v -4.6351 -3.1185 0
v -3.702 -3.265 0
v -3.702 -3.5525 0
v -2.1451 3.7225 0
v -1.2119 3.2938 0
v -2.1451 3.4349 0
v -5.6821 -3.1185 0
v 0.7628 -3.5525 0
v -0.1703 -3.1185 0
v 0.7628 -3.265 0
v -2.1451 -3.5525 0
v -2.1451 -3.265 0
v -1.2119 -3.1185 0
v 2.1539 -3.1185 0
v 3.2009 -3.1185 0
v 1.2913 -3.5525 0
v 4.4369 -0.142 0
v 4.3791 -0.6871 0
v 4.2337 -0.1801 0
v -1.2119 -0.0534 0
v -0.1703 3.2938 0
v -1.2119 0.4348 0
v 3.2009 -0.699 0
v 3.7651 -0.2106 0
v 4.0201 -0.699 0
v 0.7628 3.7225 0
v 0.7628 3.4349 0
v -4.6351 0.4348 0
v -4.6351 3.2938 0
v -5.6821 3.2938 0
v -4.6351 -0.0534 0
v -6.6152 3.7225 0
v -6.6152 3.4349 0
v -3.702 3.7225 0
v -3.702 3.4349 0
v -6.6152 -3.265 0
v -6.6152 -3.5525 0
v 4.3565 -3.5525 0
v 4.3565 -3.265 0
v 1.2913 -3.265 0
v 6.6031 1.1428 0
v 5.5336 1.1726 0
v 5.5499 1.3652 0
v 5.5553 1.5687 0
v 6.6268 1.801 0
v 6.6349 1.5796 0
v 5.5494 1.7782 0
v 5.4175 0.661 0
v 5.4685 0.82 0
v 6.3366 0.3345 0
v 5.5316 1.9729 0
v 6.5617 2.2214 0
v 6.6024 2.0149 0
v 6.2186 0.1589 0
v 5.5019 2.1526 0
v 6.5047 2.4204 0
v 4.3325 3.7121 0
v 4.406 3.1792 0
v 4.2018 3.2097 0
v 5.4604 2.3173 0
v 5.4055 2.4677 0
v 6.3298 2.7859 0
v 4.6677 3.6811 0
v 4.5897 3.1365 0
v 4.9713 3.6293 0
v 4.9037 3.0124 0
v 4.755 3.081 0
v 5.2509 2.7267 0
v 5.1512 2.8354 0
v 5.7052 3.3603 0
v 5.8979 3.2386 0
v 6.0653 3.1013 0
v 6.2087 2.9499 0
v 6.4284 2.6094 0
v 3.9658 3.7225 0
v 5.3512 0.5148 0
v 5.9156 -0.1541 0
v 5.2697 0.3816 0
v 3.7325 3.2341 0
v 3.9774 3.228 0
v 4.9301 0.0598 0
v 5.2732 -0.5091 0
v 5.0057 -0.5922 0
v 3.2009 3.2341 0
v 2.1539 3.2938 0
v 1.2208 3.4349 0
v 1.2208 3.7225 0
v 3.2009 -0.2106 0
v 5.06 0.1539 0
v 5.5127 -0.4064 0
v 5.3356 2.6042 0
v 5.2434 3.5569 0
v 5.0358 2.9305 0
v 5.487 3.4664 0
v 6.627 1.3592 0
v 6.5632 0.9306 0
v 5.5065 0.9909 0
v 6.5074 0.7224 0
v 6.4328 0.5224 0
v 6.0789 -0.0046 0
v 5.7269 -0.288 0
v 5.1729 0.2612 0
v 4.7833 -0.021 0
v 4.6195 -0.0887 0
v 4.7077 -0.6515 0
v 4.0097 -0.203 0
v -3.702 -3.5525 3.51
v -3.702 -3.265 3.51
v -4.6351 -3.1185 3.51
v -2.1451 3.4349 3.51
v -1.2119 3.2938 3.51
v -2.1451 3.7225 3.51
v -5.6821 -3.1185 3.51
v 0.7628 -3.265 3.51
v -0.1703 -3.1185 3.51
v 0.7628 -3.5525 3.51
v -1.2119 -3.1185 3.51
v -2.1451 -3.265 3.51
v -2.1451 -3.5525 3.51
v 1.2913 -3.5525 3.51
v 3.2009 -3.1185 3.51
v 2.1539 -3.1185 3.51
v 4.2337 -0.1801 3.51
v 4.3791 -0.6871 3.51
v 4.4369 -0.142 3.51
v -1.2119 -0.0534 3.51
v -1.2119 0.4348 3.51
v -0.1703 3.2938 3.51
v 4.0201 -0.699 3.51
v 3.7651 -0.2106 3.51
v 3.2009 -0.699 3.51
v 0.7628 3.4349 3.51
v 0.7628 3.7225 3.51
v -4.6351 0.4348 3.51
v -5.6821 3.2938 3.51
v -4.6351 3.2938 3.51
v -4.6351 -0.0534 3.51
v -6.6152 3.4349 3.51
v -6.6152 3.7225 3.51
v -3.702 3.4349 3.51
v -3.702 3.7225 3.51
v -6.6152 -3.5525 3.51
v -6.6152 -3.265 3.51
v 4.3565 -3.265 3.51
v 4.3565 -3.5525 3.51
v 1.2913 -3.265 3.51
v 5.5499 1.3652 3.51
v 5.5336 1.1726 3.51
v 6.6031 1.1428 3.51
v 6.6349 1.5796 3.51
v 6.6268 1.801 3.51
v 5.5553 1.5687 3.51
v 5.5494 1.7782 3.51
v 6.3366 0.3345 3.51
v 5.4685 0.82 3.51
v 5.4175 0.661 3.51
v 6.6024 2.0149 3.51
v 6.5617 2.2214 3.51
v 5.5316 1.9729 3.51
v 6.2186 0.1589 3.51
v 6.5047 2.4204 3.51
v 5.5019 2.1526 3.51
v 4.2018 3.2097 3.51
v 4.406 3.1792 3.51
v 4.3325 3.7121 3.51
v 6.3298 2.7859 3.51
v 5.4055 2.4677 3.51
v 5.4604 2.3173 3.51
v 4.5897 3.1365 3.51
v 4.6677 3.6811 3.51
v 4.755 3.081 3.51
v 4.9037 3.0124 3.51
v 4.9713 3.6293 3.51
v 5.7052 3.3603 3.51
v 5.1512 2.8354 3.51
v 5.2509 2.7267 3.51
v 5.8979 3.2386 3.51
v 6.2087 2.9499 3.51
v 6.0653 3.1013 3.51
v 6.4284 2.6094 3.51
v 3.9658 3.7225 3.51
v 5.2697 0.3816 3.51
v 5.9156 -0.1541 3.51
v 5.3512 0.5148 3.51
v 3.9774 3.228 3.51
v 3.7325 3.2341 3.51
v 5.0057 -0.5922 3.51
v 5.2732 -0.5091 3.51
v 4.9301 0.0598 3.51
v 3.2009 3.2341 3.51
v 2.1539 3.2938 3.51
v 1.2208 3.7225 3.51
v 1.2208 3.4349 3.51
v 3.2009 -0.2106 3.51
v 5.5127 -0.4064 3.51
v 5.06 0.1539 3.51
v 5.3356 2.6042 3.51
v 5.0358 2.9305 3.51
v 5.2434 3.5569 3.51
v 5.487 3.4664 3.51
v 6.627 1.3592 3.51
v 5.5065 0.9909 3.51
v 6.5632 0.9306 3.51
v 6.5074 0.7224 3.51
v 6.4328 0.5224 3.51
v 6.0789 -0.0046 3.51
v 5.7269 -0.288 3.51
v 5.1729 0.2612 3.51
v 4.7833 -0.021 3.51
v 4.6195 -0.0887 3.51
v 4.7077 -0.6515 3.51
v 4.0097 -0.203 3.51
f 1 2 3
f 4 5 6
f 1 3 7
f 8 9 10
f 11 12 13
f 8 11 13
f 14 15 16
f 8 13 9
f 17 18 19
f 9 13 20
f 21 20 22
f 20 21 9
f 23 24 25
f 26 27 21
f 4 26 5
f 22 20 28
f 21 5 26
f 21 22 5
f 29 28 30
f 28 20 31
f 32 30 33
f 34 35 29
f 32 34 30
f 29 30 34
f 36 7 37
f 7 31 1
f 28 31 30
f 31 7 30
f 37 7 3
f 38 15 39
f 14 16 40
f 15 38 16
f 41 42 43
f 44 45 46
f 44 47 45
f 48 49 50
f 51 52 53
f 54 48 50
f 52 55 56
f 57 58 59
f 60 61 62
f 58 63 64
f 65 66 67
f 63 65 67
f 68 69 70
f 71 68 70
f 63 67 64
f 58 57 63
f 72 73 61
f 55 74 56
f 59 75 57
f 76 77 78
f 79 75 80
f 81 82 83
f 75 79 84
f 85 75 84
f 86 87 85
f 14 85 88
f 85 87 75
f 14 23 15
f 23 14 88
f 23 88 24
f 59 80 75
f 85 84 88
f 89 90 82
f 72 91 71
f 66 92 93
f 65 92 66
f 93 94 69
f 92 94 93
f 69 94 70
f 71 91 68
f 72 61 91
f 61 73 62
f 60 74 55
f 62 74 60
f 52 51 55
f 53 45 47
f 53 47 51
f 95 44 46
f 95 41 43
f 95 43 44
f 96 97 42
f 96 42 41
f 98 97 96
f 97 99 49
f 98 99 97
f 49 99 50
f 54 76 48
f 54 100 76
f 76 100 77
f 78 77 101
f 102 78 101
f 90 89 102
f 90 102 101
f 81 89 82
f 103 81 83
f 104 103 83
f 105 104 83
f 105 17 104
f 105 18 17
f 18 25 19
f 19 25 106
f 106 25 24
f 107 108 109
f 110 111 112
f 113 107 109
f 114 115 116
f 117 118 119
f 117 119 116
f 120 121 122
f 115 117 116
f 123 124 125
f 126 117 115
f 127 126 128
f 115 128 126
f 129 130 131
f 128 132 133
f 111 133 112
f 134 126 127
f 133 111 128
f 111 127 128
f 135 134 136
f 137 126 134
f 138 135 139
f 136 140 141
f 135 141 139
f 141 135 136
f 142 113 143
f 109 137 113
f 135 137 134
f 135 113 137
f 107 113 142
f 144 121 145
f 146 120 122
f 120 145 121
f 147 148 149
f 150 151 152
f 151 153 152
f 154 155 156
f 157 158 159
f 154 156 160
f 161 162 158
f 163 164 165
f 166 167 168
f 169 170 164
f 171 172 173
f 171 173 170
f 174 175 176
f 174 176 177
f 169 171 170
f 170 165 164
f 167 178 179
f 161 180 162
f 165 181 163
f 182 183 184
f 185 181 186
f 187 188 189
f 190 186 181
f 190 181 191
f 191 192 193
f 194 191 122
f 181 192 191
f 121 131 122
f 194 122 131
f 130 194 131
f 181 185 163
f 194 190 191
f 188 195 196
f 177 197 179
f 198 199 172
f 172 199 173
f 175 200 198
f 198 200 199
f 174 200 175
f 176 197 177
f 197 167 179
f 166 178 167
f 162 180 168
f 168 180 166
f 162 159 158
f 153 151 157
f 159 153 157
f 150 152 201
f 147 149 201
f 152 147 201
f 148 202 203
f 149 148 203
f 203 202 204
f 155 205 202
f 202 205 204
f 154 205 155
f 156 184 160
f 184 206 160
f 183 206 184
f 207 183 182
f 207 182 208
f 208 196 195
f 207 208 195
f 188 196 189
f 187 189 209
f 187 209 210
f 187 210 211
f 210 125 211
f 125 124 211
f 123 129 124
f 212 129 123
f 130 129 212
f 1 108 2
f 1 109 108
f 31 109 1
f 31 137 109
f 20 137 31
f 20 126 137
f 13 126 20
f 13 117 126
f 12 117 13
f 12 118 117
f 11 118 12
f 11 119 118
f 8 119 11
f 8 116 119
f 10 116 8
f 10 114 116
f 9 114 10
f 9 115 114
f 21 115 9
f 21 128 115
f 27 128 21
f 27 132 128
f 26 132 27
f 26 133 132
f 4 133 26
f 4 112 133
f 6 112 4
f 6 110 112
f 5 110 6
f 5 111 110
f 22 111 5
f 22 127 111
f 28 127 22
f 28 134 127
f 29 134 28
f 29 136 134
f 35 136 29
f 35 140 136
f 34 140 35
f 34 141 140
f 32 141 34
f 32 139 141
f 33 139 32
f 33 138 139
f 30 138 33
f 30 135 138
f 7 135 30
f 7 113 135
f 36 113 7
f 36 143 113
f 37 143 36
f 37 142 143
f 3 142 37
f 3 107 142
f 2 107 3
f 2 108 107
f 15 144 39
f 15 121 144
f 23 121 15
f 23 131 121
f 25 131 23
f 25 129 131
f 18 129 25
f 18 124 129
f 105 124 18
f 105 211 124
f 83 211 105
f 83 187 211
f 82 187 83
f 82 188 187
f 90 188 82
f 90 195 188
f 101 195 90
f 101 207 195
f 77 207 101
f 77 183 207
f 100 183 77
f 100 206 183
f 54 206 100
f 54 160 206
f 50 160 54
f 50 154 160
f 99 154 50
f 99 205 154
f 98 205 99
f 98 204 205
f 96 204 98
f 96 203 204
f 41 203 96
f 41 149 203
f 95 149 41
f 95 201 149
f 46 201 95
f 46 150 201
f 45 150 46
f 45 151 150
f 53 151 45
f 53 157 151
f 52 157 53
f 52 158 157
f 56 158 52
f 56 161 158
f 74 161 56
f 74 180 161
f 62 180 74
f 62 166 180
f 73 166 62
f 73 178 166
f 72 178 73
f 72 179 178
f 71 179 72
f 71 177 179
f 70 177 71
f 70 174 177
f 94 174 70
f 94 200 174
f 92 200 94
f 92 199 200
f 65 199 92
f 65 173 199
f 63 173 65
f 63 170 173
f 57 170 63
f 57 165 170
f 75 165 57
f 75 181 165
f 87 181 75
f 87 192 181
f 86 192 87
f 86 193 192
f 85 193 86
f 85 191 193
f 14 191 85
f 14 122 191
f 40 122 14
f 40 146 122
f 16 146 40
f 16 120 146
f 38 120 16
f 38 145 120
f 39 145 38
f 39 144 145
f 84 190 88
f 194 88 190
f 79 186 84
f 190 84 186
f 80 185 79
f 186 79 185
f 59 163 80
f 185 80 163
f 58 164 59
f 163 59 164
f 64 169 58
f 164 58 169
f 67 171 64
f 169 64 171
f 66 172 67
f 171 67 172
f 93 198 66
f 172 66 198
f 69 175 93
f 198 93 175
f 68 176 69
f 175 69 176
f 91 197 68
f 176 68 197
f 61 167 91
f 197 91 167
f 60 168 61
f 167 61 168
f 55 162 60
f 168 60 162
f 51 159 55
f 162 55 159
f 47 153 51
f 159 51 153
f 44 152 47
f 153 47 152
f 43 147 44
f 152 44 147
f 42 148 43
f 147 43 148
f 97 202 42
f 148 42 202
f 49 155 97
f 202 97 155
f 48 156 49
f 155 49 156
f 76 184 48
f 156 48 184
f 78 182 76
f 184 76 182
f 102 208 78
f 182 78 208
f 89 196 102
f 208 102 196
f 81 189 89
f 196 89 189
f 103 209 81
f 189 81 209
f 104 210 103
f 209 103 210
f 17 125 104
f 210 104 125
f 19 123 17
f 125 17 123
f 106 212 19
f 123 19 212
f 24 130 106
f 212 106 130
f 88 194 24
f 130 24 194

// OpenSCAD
// file: src/text_main.scad
// text/main.scad
//
// This is the main logic file for the Text model.
// It includes configuration and then renders the 3D text object.



// --- Helper Modules ---
// Construct the font string with style
style_string = use_bold ? (use_italic ? "Bold Italic" : "Bold") : (use_italic ? "Italic" : "");
font_with_style = str(text_font, style_string == "" ? "" : ":style=", style_string);

module generate_text(text_string) {
    linear_extrude(height = text_depth + 0.01) {
        text(text_string, size = text_size, font = font_with_style, halign = "center", valign = "center");
    }
}

// --- Main ---
if (text_to_generate == "All") {
    // Arrange the text objects in a line
    translate([-60, 0, 0]) generate_text("HP");
    translate([-30, 0, 0]) generate_text("Hope");
    translate([10, 0, 0]) generate_text("Armor");
    translate([50, 0, 0]) generate_text("Stress");
} else {
    generate_text(text_to_generate);
}
// main file
// text.scad
//
// This is the main entry point for the Text OpenSCAD model.
// It includes user-configurable parameters and the core logic from text/main.scad.

/* [General] */
// Which text to generate?
text_to_generate = "HP"; // ["HP", "Hope", "Armor", "Stress", "All"]

/* [Text Properties] */
text_depth = 3.5; // Depth of the extruded text
text_size = 8; // Font size of the text

/* [Font] */
// Which font to use?
text_font = "Times New Roman"; // ["Liberation Sans", "Arial", "Helvetica", "Times New Roman", "Courier New", "Verdana"] Font family for the text
use_bold = false; // [boolean] Whether to use bold style for text
use_italic = false; // [boolean] Whether to use italic style for text

include <src/text_main.scad>
